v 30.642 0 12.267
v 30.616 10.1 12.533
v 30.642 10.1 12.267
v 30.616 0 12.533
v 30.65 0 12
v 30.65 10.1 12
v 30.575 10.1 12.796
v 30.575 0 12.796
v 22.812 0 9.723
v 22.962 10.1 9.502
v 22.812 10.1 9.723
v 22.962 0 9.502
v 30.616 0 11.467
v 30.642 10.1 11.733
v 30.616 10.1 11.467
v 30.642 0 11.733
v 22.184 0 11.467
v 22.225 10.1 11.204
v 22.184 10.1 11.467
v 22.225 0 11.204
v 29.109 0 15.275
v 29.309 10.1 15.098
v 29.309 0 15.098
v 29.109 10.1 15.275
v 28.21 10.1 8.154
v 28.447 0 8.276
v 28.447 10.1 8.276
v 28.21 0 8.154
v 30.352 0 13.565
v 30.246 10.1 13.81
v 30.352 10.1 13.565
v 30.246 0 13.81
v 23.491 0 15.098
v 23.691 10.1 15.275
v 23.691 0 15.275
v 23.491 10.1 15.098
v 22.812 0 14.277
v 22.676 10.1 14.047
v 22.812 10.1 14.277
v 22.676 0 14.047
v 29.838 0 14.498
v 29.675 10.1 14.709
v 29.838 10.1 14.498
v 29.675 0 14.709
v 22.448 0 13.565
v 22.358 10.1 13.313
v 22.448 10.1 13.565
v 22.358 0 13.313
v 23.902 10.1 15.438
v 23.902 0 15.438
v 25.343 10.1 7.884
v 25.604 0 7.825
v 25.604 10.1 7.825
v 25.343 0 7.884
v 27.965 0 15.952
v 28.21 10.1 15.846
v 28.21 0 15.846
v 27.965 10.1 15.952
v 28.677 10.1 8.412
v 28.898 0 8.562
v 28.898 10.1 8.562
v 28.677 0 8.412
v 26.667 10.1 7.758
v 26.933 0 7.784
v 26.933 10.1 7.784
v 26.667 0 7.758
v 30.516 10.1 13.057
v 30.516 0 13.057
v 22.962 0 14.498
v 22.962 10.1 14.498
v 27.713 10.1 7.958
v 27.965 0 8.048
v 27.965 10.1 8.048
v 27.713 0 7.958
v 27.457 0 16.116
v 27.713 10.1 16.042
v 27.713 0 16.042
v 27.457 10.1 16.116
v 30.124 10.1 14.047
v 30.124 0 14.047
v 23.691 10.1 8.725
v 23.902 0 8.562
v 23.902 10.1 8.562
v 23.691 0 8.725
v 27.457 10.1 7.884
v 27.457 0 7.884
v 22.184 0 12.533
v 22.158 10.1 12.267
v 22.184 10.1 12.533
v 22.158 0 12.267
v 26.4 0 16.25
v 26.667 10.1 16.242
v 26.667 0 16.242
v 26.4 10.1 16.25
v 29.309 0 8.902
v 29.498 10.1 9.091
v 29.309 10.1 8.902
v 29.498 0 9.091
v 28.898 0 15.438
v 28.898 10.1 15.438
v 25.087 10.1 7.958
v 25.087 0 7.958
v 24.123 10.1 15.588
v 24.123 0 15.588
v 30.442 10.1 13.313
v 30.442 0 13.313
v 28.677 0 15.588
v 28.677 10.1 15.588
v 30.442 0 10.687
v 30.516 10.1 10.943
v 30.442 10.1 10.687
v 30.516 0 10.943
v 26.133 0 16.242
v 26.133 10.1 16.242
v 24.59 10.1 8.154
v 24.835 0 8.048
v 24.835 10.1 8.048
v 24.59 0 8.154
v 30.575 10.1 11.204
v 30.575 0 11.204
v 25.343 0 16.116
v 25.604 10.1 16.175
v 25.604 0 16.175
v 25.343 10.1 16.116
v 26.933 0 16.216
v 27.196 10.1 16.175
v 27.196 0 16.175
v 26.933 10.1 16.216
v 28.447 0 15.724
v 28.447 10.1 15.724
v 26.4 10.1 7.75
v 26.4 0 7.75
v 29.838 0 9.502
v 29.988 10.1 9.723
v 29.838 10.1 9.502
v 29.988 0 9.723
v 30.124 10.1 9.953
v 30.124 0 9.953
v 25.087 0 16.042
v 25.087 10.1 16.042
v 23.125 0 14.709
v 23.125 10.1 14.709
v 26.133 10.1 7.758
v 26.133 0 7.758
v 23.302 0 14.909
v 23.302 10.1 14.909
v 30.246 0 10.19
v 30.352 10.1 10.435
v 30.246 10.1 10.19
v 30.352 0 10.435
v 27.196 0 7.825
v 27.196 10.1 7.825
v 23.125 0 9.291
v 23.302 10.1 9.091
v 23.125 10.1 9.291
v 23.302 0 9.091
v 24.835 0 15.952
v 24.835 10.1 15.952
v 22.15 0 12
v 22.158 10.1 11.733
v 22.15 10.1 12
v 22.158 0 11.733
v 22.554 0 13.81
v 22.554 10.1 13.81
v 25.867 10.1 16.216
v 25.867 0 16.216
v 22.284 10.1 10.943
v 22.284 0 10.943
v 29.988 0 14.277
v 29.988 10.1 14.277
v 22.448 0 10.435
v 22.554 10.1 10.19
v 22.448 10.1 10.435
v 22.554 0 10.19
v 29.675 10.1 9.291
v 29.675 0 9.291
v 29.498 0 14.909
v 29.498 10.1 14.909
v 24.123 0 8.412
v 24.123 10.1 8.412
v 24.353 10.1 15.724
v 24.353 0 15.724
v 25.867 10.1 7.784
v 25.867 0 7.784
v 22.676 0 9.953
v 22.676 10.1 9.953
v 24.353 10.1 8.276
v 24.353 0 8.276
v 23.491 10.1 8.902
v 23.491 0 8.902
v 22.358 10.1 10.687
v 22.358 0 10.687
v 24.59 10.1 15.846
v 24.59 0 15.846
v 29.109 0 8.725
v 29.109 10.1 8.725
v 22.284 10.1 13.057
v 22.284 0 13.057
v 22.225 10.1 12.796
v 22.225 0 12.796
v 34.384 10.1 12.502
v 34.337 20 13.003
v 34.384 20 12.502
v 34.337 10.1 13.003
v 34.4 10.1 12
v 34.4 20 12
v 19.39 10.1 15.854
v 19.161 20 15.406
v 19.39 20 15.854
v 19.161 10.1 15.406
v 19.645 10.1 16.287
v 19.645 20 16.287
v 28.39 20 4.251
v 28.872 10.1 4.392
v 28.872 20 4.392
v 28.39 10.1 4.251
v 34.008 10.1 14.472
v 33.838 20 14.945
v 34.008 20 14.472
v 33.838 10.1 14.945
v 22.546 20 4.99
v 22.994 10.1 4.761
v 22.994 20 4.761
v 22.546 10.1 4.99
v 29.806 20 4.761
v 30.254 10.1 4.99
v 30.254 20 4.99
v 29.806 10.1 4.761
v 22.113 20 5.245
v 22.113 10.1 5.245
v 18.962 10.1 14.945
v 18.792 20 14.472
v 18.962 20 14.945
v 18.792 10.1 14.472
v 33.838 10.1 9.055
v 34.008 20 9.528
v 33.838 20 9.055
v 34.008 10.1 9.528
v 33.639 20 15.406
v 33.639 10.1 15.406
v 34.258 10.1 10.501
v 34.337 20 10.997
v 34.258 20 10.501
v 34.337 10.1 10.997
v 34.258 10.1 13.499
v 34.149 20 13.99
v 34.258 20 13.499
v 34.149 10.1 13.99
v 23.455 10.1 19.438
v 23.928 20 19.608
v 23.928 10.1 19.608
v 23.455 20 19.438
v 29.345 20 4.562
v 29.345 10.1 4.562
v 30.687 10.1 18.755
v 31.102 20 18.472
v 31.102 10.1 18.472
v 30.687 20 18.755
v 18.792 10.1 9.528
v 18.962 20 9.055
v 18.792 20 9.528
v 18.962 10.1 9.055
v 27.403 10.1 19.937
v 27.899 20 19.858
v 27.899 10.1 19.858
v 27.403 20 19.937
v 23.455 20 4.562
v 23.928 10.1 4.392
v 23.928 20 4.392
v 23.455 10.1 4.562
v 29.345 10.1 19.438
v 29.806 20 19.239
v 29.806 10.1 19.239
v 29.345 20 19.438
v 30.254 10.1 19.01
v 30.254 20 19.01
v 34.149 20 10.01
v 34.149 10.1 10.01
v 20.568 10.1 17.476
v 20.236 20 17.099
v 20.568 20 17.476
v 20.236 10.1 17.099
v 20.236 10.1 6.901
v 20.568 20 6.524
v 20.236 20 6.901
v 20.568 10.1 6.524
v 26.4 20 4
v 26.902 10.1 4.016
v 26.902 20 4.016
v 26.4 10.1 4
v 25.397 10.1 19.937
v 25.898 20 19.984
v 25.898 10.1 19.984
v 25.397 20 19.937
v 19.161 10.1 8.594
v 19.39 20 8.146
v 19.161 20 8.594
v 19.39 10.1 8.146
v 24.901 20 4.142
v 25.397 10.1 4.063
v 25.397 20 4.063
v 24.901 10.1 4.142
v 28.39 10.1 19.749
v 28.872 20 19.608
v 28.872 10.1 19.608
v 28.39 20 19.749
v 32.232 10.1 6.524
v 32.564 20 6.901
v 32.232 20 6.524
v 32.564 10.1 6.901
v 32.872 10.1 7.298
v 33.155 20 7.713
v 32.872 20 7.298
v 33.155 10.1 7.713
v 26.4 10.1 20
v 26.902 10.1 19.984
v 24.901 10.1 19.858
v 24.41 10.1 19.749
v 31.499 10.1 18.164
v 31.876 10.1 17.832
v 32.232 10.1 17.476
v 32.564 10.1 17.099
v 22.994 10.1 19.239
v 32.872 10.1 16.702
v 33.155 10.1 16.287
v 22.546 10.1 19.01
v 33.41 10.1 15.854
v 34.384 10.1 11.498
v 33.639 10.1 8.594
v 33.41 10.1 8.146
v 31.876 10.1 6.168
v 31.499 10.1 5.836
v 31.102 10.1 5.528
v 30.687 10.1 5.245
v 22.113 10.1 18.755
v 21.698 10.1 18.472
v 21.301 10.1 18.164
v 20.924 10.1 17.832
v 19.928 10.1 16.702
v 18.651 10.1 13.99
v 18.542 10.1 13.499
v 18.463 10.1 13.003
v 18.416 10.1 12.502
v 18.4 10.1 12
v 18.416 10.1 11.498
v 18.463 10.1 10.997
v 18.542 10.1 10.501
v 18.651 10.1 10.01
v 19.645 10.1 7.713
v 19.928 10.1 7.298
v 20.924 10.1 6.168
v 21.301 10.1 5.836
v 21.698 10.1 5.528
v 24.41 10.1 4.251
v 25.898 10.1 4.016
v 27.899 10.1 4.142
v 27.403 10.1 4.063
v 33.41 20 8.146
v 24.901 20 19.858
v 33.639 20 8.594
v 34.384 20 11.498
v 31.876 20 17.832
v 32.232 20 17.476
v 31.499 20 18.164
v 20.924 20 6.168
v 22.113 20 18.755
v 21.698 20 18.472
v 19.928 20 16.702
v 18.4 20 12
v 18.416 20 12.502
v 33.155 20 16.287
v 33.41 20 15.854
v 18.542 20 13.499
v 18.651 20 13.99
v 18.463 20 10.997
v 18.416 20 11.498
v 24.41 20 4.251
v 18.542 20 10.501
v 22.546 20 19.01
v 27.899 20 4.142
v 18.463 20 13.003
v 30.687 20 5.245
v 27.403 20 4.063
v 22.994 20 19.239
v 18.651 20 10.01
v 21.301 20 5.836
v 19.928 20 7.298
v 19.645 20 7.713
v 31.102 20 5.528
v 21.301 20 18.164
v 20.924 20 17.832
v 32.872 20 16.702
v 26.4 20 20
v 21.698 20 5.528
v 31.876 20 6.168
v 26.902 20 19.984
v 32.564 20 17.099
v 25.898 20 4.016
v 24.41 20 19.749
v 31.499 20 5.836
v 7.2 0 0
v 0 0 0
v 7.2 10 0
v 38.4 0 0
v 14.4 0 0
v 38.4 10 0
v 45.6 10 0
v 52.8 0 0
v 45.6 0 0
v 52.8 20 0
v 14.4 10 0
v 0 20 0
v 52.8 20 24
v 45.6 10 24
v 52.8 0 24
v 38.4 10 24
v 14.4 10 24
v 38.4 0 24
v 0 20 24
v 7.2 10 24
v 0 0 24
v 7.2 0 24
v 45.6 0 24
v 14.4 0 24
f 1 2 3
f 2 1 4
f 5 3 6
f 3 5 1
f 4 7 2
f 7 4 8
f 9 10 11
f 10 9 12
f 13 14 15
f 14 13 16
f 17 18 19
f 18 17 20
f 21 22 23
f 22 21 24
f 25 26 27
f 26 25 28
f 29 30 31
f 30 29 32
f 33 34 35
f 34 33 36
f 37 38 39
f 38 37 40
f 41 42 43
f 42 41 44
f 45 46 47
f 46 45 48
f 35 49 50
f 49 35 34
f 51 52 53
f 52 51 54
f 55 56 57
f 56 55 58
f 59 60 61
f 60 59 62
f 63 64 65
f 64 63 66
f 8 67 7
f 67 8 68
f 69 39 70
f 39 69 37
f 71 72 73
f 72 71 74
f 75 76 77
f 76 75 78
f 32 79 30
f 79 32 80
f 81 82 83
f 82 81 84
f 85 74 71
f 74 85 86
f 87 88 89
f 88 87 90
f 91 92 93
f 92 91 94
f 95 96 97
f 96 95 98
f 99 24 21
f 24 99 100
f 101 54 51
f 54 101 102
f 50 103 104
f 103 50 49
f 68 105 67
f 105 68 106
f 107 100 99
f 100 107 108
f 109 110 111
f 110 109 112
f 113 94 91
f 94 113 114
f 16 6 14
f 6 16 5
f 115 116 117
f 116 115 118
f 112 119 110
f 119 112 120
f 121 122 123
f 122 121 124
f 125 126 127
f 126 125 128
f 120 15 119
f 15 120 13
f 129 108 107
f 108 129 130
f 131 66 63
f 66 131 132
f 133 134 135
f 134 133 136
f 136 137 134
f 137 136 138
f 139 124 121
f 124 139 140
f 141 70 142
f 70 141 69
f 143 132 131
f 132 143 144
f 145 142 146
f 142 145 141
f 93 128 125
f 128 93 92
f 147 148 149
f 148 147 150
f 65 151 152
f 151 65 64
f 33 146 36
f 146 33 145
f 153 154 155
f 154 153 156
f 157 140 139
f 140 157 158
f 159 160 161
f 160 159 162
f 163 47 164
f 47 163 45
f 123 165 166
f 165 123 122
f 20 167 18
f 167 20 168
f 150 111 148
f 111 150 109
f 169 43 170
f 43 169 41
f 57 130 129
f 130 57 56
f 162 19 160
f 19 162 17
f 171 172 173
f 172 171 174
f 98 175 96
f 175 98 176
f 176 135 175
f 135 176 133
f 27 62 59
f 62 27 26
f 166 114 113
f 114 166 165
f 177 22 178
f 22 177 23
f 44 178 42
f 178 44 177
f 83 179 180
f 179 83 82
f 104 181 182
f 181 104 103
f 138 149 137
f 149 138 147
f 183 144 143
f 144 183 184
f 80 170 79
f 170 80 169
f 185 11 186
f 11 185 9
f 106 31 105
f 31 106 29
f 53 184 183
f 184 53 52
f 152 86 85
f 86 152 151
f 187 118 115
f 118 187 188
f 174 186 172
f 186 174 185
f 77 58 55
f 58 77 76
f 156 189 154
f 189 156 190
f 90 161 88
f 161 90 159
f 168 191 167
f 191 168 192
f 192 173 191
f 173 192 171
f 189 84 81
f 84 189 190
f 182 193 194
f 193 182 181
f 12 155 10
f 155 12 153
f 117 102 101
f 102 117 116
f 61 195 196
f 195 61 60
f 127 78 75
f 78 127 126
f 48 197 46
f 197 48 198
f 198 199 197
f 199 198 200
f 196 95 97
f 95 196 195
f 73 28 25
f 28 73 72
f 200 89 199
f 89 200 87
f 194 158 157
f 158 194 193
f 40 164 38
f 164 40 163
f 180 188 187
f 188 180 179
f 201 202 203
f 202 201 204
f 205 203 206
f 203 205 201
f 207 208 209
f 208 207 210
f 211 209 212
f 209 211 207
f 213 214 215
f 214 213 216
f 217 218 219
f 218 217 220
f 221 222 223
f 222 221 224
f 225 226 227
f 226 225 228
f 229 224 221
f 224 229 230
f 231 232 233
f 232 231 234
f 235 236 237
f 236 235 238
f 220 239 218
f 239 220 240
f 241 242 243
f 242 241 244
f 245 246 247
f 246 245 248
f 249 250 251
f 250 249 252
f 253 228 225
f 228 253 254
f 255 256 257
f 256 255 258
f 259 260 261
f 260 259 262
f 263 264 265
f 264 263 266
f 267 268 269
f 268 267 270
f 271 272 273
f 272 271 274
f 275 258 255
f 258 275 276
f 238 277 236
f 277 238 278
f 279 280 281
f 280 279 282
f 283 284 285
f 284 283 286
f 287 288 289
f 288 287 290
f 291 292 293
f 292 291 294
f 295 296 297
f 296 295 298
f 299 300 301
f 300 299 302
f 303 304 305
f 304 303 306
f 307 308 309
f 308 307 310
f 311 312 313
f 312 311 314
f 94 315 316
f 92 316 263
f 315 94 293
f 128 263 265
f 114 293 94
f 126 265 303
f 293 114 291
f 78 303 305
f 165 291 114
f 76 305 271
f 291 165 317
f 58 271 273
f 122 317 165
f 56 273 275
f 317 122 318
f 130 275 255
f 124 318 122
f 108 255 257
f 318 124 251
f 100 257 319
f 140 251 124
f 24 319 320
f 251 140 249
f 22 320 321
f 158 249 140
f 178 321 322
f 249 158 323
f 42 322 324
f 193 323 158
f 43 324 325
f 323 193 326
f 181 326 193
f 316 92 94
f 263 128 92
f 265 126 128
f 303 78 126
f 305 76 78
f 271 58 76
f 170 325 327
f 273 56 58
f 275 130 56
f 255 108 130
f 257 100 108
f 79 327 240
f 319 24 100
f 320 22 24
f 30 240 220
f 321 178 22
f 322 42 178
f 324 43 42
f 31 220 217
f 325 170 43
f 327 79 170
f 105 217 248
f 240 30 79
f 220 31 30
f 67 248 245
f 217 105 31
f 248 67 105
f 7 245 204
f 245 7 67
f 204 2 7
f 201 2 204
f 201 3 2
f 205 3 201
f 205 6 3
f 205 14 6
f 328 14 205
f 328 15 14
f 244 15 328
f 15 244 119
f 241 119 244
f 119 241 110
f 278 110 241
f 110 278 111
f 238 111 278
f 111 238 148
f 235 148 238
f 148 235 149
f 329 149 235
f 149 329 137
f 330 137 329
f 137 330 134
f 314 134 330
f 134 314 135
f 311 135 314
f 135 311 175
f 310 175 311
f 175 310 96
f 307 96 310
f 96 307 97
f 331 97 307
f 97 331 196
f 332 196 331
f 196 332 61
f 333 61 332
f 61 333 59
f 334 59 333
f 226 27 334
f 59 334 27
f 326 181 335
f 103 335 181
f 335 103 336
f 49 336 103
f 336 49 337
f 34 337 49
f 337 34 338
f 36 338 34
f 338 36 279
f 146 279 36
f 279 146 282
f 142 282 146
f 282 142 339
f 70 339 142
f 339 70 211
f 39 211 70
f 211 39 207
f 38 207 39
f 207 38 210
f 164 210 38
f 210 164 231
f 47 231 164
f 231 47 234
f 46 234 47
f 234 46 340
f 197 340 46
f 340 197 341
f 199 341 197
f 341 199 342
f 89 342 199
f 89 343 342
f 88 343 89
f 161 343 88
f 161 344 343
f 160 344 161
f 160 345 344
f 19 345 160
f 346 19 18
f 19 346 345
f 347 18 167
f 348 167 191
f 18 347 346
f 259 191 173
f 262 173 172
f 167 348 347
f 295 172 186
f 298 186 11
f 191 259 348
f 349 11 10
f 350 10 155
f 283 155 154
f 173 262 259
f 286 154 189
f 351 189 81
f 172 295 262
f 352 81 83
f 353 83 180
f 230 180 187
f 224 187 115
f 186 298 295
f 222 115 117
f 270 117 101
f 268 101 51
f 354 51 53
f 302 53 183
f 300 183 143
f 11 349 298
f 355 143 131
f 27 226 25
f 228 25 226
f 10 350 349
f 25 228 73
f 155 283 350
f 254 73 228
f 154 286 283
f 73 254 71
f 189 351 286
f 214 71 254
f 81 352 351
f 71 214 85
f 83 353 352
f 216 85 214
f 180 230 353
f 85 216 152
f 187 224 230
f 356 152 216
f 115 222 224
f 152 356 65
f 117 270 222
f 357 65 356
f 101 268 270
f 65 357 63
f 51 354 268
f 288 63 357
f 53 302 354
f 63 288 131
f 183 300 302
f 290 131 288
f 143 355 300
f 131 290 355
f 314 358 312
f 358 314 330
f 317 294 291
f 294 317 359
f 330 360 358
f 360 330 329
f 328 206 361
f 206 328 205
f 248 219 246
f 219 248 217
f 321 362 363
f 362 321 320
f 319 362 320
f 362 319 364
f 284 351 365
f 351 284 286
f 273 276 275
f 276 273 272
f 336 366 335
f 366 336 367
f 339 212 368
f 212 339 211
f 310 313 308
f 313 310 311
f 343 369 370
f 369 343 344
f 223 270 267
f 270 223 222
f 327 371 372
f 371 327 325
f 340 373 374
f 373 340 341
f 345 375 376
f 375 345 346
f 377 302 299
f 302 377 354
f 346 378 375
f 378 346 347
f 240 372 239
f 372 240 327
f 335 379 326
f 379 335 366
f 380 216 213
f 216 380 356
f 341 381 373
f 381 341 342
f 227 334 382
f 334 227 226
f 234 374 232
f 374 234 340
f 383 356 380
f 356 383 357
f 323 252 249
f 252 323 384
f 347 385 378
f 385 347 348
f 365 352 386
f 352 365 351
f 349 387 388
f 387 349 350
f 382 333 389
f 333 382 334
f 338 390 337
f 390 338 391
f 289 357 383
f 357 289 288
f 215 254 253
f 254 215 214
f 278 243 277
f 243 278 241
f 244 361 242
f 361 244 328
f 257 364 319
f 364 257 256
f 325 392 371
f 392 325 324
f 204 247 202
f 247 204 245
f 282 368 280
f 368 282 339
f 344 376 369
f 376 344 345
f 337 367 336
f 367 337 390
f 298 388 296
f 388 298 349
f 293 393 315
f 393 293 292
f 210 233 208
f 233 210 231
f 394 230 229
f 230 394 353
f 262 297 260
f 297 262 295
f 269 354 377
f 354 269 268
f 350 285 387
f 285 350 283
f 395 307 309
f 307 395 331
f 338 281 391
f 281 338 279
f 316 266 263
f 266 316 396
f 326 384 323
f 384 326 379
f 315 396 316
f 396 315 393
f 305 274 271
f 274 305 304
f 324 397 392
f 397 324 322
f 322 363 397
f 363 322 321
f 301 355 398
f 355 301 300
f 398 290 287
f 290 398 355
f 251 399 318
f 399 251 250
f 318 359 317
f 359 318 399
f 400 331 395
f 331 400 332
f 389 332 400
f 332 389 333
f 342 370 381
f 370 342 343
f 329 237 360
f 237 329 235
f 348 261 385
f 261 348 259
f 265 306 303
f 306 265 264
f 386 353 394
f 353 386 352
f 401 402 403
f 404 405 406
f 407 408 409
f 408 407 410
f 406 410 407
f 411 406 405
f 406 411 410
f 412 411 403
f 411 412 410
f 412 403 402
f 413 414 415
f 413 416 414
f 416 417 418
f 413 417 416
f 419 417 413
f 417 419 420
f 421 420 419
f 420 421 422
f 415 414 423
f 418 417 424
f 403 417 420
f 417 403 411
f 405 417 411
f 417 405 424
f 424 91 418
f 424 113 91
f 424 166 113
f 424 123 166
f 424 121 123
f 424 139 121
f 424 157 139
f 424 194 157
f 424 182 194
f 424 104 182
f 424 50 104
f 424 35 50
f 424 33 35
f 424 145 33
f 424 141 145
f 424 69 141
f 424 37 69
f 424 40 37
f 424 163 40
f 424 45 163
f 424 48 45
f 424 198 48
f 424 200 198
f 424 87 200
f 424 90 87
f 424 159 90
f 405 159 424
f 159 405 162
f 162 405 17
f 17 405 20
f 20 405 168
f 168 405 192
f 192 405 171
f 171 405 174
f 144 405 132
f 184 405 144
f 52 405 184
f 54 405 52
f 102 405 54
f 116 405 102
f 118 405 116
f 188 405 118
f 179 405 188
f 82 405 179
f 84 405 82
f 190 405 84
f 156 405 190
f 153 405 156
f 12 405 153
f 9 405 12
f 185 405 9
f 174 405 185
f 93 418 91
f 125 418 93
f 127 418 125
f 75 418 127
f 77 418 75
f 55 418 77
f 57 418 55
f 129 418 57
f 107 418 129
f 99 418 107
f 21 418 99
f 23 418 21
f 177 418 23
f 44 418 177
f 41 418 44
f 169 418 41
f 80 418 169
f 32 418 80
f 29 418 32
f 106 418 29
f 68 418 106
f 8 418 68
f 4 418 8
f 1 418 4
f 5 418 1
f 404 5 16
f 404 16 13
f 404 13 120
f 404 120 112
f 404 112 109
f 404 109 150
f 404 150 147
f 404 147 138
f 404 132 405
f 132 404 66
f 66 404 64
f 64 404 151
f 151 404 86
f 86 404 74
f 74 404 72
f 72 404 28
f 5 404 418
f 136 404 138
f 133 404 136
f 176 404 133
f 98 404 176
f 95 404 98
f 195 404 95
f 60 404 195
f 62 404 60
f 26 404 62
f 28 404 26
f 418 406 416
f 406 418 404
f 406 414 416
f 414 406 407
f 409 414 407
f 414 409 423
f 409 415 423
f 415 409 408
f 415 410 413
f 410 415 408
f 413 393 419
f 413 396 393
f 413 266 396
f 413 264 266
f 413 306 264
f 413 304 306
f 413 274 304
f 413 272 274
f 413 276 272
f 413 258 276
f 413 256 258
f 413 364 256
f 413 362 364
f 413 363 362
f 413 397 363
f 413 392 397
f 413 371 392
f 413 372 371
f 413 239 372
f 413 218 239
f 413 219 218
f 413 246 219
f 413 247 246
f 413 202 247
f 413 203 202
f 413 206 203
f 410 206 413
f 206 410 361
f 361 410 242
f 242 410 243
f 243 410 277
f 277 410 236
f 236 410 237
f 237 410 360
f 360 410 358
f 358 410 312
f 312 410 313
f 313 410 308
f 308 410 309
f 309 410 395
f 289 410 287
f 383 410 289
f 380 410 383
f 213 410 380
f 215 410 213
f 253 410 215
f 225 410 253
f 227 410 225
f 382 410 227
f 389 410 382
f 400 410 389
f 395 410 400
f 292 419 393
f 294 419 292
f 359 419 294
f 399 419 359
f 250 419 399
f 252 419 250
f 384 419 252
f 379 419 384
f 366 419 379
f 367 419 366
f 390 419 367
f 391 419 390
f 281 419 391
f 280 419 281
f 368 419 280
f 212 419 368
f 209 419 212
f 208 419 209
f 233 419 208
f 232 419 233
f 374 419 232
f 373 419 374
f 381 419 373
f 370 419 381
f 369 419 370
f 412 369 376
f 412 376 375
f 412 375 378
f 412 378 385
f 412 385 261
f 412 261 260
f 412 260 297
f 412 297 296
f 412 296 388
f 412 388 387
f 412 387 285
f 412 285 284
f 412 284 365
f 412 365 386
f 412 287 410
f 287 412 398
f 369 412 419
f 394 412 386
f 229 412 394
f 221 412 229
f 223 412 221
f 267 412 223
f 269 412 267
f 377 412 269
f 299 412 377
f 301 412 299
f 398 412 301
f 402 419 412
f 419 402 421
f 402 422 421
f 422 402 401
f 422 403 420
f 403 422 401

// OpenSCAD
$fn=100;

height = 10;
webbing_thickness = 7.2;
hole_edge = 24;

washer_id = 8.5;
washer_od = 16;

clip_width = 1.50*washer_od;
clip_len = 4*webbing_thickness+hole_edge;

clip_pts = [
    [0,0],
    [webbing_thickness, 0],
    [webbing_thickness, height],
    [webbing_thickness+webbing_thickness, height],
    [webbing_thickness+webbing_thickness, 0],
    [2*webbing_thickness+hole_edge, 0],
    [2*webbing_thickness+hole_edge, height],
    [3*webbing_thickness+hole_edge, height],
    [3*webbing_thickness+hole_edge, 0],
    [4*webbing_thickness+hole_edge, 0],
    [4*webbing_thickness+hole_edge, 2*height],
    [0, 2*height],
 ];

difference() {    
    linear_extrude(height = clip_width)
    {
        polygon(points = clip_pts);
    }
    color("red") {
        translate([clip_len/2, 2*height+0.1, clip_width/2]) {
            rotate([90, 0, 0]) {
                union()
                {
                    cylinder(d=washer_id, h=2*height+0.2, center=false);
                    cylinder(d=washer_od, h=height, center=false);
                }
            }
        }
    }
}
